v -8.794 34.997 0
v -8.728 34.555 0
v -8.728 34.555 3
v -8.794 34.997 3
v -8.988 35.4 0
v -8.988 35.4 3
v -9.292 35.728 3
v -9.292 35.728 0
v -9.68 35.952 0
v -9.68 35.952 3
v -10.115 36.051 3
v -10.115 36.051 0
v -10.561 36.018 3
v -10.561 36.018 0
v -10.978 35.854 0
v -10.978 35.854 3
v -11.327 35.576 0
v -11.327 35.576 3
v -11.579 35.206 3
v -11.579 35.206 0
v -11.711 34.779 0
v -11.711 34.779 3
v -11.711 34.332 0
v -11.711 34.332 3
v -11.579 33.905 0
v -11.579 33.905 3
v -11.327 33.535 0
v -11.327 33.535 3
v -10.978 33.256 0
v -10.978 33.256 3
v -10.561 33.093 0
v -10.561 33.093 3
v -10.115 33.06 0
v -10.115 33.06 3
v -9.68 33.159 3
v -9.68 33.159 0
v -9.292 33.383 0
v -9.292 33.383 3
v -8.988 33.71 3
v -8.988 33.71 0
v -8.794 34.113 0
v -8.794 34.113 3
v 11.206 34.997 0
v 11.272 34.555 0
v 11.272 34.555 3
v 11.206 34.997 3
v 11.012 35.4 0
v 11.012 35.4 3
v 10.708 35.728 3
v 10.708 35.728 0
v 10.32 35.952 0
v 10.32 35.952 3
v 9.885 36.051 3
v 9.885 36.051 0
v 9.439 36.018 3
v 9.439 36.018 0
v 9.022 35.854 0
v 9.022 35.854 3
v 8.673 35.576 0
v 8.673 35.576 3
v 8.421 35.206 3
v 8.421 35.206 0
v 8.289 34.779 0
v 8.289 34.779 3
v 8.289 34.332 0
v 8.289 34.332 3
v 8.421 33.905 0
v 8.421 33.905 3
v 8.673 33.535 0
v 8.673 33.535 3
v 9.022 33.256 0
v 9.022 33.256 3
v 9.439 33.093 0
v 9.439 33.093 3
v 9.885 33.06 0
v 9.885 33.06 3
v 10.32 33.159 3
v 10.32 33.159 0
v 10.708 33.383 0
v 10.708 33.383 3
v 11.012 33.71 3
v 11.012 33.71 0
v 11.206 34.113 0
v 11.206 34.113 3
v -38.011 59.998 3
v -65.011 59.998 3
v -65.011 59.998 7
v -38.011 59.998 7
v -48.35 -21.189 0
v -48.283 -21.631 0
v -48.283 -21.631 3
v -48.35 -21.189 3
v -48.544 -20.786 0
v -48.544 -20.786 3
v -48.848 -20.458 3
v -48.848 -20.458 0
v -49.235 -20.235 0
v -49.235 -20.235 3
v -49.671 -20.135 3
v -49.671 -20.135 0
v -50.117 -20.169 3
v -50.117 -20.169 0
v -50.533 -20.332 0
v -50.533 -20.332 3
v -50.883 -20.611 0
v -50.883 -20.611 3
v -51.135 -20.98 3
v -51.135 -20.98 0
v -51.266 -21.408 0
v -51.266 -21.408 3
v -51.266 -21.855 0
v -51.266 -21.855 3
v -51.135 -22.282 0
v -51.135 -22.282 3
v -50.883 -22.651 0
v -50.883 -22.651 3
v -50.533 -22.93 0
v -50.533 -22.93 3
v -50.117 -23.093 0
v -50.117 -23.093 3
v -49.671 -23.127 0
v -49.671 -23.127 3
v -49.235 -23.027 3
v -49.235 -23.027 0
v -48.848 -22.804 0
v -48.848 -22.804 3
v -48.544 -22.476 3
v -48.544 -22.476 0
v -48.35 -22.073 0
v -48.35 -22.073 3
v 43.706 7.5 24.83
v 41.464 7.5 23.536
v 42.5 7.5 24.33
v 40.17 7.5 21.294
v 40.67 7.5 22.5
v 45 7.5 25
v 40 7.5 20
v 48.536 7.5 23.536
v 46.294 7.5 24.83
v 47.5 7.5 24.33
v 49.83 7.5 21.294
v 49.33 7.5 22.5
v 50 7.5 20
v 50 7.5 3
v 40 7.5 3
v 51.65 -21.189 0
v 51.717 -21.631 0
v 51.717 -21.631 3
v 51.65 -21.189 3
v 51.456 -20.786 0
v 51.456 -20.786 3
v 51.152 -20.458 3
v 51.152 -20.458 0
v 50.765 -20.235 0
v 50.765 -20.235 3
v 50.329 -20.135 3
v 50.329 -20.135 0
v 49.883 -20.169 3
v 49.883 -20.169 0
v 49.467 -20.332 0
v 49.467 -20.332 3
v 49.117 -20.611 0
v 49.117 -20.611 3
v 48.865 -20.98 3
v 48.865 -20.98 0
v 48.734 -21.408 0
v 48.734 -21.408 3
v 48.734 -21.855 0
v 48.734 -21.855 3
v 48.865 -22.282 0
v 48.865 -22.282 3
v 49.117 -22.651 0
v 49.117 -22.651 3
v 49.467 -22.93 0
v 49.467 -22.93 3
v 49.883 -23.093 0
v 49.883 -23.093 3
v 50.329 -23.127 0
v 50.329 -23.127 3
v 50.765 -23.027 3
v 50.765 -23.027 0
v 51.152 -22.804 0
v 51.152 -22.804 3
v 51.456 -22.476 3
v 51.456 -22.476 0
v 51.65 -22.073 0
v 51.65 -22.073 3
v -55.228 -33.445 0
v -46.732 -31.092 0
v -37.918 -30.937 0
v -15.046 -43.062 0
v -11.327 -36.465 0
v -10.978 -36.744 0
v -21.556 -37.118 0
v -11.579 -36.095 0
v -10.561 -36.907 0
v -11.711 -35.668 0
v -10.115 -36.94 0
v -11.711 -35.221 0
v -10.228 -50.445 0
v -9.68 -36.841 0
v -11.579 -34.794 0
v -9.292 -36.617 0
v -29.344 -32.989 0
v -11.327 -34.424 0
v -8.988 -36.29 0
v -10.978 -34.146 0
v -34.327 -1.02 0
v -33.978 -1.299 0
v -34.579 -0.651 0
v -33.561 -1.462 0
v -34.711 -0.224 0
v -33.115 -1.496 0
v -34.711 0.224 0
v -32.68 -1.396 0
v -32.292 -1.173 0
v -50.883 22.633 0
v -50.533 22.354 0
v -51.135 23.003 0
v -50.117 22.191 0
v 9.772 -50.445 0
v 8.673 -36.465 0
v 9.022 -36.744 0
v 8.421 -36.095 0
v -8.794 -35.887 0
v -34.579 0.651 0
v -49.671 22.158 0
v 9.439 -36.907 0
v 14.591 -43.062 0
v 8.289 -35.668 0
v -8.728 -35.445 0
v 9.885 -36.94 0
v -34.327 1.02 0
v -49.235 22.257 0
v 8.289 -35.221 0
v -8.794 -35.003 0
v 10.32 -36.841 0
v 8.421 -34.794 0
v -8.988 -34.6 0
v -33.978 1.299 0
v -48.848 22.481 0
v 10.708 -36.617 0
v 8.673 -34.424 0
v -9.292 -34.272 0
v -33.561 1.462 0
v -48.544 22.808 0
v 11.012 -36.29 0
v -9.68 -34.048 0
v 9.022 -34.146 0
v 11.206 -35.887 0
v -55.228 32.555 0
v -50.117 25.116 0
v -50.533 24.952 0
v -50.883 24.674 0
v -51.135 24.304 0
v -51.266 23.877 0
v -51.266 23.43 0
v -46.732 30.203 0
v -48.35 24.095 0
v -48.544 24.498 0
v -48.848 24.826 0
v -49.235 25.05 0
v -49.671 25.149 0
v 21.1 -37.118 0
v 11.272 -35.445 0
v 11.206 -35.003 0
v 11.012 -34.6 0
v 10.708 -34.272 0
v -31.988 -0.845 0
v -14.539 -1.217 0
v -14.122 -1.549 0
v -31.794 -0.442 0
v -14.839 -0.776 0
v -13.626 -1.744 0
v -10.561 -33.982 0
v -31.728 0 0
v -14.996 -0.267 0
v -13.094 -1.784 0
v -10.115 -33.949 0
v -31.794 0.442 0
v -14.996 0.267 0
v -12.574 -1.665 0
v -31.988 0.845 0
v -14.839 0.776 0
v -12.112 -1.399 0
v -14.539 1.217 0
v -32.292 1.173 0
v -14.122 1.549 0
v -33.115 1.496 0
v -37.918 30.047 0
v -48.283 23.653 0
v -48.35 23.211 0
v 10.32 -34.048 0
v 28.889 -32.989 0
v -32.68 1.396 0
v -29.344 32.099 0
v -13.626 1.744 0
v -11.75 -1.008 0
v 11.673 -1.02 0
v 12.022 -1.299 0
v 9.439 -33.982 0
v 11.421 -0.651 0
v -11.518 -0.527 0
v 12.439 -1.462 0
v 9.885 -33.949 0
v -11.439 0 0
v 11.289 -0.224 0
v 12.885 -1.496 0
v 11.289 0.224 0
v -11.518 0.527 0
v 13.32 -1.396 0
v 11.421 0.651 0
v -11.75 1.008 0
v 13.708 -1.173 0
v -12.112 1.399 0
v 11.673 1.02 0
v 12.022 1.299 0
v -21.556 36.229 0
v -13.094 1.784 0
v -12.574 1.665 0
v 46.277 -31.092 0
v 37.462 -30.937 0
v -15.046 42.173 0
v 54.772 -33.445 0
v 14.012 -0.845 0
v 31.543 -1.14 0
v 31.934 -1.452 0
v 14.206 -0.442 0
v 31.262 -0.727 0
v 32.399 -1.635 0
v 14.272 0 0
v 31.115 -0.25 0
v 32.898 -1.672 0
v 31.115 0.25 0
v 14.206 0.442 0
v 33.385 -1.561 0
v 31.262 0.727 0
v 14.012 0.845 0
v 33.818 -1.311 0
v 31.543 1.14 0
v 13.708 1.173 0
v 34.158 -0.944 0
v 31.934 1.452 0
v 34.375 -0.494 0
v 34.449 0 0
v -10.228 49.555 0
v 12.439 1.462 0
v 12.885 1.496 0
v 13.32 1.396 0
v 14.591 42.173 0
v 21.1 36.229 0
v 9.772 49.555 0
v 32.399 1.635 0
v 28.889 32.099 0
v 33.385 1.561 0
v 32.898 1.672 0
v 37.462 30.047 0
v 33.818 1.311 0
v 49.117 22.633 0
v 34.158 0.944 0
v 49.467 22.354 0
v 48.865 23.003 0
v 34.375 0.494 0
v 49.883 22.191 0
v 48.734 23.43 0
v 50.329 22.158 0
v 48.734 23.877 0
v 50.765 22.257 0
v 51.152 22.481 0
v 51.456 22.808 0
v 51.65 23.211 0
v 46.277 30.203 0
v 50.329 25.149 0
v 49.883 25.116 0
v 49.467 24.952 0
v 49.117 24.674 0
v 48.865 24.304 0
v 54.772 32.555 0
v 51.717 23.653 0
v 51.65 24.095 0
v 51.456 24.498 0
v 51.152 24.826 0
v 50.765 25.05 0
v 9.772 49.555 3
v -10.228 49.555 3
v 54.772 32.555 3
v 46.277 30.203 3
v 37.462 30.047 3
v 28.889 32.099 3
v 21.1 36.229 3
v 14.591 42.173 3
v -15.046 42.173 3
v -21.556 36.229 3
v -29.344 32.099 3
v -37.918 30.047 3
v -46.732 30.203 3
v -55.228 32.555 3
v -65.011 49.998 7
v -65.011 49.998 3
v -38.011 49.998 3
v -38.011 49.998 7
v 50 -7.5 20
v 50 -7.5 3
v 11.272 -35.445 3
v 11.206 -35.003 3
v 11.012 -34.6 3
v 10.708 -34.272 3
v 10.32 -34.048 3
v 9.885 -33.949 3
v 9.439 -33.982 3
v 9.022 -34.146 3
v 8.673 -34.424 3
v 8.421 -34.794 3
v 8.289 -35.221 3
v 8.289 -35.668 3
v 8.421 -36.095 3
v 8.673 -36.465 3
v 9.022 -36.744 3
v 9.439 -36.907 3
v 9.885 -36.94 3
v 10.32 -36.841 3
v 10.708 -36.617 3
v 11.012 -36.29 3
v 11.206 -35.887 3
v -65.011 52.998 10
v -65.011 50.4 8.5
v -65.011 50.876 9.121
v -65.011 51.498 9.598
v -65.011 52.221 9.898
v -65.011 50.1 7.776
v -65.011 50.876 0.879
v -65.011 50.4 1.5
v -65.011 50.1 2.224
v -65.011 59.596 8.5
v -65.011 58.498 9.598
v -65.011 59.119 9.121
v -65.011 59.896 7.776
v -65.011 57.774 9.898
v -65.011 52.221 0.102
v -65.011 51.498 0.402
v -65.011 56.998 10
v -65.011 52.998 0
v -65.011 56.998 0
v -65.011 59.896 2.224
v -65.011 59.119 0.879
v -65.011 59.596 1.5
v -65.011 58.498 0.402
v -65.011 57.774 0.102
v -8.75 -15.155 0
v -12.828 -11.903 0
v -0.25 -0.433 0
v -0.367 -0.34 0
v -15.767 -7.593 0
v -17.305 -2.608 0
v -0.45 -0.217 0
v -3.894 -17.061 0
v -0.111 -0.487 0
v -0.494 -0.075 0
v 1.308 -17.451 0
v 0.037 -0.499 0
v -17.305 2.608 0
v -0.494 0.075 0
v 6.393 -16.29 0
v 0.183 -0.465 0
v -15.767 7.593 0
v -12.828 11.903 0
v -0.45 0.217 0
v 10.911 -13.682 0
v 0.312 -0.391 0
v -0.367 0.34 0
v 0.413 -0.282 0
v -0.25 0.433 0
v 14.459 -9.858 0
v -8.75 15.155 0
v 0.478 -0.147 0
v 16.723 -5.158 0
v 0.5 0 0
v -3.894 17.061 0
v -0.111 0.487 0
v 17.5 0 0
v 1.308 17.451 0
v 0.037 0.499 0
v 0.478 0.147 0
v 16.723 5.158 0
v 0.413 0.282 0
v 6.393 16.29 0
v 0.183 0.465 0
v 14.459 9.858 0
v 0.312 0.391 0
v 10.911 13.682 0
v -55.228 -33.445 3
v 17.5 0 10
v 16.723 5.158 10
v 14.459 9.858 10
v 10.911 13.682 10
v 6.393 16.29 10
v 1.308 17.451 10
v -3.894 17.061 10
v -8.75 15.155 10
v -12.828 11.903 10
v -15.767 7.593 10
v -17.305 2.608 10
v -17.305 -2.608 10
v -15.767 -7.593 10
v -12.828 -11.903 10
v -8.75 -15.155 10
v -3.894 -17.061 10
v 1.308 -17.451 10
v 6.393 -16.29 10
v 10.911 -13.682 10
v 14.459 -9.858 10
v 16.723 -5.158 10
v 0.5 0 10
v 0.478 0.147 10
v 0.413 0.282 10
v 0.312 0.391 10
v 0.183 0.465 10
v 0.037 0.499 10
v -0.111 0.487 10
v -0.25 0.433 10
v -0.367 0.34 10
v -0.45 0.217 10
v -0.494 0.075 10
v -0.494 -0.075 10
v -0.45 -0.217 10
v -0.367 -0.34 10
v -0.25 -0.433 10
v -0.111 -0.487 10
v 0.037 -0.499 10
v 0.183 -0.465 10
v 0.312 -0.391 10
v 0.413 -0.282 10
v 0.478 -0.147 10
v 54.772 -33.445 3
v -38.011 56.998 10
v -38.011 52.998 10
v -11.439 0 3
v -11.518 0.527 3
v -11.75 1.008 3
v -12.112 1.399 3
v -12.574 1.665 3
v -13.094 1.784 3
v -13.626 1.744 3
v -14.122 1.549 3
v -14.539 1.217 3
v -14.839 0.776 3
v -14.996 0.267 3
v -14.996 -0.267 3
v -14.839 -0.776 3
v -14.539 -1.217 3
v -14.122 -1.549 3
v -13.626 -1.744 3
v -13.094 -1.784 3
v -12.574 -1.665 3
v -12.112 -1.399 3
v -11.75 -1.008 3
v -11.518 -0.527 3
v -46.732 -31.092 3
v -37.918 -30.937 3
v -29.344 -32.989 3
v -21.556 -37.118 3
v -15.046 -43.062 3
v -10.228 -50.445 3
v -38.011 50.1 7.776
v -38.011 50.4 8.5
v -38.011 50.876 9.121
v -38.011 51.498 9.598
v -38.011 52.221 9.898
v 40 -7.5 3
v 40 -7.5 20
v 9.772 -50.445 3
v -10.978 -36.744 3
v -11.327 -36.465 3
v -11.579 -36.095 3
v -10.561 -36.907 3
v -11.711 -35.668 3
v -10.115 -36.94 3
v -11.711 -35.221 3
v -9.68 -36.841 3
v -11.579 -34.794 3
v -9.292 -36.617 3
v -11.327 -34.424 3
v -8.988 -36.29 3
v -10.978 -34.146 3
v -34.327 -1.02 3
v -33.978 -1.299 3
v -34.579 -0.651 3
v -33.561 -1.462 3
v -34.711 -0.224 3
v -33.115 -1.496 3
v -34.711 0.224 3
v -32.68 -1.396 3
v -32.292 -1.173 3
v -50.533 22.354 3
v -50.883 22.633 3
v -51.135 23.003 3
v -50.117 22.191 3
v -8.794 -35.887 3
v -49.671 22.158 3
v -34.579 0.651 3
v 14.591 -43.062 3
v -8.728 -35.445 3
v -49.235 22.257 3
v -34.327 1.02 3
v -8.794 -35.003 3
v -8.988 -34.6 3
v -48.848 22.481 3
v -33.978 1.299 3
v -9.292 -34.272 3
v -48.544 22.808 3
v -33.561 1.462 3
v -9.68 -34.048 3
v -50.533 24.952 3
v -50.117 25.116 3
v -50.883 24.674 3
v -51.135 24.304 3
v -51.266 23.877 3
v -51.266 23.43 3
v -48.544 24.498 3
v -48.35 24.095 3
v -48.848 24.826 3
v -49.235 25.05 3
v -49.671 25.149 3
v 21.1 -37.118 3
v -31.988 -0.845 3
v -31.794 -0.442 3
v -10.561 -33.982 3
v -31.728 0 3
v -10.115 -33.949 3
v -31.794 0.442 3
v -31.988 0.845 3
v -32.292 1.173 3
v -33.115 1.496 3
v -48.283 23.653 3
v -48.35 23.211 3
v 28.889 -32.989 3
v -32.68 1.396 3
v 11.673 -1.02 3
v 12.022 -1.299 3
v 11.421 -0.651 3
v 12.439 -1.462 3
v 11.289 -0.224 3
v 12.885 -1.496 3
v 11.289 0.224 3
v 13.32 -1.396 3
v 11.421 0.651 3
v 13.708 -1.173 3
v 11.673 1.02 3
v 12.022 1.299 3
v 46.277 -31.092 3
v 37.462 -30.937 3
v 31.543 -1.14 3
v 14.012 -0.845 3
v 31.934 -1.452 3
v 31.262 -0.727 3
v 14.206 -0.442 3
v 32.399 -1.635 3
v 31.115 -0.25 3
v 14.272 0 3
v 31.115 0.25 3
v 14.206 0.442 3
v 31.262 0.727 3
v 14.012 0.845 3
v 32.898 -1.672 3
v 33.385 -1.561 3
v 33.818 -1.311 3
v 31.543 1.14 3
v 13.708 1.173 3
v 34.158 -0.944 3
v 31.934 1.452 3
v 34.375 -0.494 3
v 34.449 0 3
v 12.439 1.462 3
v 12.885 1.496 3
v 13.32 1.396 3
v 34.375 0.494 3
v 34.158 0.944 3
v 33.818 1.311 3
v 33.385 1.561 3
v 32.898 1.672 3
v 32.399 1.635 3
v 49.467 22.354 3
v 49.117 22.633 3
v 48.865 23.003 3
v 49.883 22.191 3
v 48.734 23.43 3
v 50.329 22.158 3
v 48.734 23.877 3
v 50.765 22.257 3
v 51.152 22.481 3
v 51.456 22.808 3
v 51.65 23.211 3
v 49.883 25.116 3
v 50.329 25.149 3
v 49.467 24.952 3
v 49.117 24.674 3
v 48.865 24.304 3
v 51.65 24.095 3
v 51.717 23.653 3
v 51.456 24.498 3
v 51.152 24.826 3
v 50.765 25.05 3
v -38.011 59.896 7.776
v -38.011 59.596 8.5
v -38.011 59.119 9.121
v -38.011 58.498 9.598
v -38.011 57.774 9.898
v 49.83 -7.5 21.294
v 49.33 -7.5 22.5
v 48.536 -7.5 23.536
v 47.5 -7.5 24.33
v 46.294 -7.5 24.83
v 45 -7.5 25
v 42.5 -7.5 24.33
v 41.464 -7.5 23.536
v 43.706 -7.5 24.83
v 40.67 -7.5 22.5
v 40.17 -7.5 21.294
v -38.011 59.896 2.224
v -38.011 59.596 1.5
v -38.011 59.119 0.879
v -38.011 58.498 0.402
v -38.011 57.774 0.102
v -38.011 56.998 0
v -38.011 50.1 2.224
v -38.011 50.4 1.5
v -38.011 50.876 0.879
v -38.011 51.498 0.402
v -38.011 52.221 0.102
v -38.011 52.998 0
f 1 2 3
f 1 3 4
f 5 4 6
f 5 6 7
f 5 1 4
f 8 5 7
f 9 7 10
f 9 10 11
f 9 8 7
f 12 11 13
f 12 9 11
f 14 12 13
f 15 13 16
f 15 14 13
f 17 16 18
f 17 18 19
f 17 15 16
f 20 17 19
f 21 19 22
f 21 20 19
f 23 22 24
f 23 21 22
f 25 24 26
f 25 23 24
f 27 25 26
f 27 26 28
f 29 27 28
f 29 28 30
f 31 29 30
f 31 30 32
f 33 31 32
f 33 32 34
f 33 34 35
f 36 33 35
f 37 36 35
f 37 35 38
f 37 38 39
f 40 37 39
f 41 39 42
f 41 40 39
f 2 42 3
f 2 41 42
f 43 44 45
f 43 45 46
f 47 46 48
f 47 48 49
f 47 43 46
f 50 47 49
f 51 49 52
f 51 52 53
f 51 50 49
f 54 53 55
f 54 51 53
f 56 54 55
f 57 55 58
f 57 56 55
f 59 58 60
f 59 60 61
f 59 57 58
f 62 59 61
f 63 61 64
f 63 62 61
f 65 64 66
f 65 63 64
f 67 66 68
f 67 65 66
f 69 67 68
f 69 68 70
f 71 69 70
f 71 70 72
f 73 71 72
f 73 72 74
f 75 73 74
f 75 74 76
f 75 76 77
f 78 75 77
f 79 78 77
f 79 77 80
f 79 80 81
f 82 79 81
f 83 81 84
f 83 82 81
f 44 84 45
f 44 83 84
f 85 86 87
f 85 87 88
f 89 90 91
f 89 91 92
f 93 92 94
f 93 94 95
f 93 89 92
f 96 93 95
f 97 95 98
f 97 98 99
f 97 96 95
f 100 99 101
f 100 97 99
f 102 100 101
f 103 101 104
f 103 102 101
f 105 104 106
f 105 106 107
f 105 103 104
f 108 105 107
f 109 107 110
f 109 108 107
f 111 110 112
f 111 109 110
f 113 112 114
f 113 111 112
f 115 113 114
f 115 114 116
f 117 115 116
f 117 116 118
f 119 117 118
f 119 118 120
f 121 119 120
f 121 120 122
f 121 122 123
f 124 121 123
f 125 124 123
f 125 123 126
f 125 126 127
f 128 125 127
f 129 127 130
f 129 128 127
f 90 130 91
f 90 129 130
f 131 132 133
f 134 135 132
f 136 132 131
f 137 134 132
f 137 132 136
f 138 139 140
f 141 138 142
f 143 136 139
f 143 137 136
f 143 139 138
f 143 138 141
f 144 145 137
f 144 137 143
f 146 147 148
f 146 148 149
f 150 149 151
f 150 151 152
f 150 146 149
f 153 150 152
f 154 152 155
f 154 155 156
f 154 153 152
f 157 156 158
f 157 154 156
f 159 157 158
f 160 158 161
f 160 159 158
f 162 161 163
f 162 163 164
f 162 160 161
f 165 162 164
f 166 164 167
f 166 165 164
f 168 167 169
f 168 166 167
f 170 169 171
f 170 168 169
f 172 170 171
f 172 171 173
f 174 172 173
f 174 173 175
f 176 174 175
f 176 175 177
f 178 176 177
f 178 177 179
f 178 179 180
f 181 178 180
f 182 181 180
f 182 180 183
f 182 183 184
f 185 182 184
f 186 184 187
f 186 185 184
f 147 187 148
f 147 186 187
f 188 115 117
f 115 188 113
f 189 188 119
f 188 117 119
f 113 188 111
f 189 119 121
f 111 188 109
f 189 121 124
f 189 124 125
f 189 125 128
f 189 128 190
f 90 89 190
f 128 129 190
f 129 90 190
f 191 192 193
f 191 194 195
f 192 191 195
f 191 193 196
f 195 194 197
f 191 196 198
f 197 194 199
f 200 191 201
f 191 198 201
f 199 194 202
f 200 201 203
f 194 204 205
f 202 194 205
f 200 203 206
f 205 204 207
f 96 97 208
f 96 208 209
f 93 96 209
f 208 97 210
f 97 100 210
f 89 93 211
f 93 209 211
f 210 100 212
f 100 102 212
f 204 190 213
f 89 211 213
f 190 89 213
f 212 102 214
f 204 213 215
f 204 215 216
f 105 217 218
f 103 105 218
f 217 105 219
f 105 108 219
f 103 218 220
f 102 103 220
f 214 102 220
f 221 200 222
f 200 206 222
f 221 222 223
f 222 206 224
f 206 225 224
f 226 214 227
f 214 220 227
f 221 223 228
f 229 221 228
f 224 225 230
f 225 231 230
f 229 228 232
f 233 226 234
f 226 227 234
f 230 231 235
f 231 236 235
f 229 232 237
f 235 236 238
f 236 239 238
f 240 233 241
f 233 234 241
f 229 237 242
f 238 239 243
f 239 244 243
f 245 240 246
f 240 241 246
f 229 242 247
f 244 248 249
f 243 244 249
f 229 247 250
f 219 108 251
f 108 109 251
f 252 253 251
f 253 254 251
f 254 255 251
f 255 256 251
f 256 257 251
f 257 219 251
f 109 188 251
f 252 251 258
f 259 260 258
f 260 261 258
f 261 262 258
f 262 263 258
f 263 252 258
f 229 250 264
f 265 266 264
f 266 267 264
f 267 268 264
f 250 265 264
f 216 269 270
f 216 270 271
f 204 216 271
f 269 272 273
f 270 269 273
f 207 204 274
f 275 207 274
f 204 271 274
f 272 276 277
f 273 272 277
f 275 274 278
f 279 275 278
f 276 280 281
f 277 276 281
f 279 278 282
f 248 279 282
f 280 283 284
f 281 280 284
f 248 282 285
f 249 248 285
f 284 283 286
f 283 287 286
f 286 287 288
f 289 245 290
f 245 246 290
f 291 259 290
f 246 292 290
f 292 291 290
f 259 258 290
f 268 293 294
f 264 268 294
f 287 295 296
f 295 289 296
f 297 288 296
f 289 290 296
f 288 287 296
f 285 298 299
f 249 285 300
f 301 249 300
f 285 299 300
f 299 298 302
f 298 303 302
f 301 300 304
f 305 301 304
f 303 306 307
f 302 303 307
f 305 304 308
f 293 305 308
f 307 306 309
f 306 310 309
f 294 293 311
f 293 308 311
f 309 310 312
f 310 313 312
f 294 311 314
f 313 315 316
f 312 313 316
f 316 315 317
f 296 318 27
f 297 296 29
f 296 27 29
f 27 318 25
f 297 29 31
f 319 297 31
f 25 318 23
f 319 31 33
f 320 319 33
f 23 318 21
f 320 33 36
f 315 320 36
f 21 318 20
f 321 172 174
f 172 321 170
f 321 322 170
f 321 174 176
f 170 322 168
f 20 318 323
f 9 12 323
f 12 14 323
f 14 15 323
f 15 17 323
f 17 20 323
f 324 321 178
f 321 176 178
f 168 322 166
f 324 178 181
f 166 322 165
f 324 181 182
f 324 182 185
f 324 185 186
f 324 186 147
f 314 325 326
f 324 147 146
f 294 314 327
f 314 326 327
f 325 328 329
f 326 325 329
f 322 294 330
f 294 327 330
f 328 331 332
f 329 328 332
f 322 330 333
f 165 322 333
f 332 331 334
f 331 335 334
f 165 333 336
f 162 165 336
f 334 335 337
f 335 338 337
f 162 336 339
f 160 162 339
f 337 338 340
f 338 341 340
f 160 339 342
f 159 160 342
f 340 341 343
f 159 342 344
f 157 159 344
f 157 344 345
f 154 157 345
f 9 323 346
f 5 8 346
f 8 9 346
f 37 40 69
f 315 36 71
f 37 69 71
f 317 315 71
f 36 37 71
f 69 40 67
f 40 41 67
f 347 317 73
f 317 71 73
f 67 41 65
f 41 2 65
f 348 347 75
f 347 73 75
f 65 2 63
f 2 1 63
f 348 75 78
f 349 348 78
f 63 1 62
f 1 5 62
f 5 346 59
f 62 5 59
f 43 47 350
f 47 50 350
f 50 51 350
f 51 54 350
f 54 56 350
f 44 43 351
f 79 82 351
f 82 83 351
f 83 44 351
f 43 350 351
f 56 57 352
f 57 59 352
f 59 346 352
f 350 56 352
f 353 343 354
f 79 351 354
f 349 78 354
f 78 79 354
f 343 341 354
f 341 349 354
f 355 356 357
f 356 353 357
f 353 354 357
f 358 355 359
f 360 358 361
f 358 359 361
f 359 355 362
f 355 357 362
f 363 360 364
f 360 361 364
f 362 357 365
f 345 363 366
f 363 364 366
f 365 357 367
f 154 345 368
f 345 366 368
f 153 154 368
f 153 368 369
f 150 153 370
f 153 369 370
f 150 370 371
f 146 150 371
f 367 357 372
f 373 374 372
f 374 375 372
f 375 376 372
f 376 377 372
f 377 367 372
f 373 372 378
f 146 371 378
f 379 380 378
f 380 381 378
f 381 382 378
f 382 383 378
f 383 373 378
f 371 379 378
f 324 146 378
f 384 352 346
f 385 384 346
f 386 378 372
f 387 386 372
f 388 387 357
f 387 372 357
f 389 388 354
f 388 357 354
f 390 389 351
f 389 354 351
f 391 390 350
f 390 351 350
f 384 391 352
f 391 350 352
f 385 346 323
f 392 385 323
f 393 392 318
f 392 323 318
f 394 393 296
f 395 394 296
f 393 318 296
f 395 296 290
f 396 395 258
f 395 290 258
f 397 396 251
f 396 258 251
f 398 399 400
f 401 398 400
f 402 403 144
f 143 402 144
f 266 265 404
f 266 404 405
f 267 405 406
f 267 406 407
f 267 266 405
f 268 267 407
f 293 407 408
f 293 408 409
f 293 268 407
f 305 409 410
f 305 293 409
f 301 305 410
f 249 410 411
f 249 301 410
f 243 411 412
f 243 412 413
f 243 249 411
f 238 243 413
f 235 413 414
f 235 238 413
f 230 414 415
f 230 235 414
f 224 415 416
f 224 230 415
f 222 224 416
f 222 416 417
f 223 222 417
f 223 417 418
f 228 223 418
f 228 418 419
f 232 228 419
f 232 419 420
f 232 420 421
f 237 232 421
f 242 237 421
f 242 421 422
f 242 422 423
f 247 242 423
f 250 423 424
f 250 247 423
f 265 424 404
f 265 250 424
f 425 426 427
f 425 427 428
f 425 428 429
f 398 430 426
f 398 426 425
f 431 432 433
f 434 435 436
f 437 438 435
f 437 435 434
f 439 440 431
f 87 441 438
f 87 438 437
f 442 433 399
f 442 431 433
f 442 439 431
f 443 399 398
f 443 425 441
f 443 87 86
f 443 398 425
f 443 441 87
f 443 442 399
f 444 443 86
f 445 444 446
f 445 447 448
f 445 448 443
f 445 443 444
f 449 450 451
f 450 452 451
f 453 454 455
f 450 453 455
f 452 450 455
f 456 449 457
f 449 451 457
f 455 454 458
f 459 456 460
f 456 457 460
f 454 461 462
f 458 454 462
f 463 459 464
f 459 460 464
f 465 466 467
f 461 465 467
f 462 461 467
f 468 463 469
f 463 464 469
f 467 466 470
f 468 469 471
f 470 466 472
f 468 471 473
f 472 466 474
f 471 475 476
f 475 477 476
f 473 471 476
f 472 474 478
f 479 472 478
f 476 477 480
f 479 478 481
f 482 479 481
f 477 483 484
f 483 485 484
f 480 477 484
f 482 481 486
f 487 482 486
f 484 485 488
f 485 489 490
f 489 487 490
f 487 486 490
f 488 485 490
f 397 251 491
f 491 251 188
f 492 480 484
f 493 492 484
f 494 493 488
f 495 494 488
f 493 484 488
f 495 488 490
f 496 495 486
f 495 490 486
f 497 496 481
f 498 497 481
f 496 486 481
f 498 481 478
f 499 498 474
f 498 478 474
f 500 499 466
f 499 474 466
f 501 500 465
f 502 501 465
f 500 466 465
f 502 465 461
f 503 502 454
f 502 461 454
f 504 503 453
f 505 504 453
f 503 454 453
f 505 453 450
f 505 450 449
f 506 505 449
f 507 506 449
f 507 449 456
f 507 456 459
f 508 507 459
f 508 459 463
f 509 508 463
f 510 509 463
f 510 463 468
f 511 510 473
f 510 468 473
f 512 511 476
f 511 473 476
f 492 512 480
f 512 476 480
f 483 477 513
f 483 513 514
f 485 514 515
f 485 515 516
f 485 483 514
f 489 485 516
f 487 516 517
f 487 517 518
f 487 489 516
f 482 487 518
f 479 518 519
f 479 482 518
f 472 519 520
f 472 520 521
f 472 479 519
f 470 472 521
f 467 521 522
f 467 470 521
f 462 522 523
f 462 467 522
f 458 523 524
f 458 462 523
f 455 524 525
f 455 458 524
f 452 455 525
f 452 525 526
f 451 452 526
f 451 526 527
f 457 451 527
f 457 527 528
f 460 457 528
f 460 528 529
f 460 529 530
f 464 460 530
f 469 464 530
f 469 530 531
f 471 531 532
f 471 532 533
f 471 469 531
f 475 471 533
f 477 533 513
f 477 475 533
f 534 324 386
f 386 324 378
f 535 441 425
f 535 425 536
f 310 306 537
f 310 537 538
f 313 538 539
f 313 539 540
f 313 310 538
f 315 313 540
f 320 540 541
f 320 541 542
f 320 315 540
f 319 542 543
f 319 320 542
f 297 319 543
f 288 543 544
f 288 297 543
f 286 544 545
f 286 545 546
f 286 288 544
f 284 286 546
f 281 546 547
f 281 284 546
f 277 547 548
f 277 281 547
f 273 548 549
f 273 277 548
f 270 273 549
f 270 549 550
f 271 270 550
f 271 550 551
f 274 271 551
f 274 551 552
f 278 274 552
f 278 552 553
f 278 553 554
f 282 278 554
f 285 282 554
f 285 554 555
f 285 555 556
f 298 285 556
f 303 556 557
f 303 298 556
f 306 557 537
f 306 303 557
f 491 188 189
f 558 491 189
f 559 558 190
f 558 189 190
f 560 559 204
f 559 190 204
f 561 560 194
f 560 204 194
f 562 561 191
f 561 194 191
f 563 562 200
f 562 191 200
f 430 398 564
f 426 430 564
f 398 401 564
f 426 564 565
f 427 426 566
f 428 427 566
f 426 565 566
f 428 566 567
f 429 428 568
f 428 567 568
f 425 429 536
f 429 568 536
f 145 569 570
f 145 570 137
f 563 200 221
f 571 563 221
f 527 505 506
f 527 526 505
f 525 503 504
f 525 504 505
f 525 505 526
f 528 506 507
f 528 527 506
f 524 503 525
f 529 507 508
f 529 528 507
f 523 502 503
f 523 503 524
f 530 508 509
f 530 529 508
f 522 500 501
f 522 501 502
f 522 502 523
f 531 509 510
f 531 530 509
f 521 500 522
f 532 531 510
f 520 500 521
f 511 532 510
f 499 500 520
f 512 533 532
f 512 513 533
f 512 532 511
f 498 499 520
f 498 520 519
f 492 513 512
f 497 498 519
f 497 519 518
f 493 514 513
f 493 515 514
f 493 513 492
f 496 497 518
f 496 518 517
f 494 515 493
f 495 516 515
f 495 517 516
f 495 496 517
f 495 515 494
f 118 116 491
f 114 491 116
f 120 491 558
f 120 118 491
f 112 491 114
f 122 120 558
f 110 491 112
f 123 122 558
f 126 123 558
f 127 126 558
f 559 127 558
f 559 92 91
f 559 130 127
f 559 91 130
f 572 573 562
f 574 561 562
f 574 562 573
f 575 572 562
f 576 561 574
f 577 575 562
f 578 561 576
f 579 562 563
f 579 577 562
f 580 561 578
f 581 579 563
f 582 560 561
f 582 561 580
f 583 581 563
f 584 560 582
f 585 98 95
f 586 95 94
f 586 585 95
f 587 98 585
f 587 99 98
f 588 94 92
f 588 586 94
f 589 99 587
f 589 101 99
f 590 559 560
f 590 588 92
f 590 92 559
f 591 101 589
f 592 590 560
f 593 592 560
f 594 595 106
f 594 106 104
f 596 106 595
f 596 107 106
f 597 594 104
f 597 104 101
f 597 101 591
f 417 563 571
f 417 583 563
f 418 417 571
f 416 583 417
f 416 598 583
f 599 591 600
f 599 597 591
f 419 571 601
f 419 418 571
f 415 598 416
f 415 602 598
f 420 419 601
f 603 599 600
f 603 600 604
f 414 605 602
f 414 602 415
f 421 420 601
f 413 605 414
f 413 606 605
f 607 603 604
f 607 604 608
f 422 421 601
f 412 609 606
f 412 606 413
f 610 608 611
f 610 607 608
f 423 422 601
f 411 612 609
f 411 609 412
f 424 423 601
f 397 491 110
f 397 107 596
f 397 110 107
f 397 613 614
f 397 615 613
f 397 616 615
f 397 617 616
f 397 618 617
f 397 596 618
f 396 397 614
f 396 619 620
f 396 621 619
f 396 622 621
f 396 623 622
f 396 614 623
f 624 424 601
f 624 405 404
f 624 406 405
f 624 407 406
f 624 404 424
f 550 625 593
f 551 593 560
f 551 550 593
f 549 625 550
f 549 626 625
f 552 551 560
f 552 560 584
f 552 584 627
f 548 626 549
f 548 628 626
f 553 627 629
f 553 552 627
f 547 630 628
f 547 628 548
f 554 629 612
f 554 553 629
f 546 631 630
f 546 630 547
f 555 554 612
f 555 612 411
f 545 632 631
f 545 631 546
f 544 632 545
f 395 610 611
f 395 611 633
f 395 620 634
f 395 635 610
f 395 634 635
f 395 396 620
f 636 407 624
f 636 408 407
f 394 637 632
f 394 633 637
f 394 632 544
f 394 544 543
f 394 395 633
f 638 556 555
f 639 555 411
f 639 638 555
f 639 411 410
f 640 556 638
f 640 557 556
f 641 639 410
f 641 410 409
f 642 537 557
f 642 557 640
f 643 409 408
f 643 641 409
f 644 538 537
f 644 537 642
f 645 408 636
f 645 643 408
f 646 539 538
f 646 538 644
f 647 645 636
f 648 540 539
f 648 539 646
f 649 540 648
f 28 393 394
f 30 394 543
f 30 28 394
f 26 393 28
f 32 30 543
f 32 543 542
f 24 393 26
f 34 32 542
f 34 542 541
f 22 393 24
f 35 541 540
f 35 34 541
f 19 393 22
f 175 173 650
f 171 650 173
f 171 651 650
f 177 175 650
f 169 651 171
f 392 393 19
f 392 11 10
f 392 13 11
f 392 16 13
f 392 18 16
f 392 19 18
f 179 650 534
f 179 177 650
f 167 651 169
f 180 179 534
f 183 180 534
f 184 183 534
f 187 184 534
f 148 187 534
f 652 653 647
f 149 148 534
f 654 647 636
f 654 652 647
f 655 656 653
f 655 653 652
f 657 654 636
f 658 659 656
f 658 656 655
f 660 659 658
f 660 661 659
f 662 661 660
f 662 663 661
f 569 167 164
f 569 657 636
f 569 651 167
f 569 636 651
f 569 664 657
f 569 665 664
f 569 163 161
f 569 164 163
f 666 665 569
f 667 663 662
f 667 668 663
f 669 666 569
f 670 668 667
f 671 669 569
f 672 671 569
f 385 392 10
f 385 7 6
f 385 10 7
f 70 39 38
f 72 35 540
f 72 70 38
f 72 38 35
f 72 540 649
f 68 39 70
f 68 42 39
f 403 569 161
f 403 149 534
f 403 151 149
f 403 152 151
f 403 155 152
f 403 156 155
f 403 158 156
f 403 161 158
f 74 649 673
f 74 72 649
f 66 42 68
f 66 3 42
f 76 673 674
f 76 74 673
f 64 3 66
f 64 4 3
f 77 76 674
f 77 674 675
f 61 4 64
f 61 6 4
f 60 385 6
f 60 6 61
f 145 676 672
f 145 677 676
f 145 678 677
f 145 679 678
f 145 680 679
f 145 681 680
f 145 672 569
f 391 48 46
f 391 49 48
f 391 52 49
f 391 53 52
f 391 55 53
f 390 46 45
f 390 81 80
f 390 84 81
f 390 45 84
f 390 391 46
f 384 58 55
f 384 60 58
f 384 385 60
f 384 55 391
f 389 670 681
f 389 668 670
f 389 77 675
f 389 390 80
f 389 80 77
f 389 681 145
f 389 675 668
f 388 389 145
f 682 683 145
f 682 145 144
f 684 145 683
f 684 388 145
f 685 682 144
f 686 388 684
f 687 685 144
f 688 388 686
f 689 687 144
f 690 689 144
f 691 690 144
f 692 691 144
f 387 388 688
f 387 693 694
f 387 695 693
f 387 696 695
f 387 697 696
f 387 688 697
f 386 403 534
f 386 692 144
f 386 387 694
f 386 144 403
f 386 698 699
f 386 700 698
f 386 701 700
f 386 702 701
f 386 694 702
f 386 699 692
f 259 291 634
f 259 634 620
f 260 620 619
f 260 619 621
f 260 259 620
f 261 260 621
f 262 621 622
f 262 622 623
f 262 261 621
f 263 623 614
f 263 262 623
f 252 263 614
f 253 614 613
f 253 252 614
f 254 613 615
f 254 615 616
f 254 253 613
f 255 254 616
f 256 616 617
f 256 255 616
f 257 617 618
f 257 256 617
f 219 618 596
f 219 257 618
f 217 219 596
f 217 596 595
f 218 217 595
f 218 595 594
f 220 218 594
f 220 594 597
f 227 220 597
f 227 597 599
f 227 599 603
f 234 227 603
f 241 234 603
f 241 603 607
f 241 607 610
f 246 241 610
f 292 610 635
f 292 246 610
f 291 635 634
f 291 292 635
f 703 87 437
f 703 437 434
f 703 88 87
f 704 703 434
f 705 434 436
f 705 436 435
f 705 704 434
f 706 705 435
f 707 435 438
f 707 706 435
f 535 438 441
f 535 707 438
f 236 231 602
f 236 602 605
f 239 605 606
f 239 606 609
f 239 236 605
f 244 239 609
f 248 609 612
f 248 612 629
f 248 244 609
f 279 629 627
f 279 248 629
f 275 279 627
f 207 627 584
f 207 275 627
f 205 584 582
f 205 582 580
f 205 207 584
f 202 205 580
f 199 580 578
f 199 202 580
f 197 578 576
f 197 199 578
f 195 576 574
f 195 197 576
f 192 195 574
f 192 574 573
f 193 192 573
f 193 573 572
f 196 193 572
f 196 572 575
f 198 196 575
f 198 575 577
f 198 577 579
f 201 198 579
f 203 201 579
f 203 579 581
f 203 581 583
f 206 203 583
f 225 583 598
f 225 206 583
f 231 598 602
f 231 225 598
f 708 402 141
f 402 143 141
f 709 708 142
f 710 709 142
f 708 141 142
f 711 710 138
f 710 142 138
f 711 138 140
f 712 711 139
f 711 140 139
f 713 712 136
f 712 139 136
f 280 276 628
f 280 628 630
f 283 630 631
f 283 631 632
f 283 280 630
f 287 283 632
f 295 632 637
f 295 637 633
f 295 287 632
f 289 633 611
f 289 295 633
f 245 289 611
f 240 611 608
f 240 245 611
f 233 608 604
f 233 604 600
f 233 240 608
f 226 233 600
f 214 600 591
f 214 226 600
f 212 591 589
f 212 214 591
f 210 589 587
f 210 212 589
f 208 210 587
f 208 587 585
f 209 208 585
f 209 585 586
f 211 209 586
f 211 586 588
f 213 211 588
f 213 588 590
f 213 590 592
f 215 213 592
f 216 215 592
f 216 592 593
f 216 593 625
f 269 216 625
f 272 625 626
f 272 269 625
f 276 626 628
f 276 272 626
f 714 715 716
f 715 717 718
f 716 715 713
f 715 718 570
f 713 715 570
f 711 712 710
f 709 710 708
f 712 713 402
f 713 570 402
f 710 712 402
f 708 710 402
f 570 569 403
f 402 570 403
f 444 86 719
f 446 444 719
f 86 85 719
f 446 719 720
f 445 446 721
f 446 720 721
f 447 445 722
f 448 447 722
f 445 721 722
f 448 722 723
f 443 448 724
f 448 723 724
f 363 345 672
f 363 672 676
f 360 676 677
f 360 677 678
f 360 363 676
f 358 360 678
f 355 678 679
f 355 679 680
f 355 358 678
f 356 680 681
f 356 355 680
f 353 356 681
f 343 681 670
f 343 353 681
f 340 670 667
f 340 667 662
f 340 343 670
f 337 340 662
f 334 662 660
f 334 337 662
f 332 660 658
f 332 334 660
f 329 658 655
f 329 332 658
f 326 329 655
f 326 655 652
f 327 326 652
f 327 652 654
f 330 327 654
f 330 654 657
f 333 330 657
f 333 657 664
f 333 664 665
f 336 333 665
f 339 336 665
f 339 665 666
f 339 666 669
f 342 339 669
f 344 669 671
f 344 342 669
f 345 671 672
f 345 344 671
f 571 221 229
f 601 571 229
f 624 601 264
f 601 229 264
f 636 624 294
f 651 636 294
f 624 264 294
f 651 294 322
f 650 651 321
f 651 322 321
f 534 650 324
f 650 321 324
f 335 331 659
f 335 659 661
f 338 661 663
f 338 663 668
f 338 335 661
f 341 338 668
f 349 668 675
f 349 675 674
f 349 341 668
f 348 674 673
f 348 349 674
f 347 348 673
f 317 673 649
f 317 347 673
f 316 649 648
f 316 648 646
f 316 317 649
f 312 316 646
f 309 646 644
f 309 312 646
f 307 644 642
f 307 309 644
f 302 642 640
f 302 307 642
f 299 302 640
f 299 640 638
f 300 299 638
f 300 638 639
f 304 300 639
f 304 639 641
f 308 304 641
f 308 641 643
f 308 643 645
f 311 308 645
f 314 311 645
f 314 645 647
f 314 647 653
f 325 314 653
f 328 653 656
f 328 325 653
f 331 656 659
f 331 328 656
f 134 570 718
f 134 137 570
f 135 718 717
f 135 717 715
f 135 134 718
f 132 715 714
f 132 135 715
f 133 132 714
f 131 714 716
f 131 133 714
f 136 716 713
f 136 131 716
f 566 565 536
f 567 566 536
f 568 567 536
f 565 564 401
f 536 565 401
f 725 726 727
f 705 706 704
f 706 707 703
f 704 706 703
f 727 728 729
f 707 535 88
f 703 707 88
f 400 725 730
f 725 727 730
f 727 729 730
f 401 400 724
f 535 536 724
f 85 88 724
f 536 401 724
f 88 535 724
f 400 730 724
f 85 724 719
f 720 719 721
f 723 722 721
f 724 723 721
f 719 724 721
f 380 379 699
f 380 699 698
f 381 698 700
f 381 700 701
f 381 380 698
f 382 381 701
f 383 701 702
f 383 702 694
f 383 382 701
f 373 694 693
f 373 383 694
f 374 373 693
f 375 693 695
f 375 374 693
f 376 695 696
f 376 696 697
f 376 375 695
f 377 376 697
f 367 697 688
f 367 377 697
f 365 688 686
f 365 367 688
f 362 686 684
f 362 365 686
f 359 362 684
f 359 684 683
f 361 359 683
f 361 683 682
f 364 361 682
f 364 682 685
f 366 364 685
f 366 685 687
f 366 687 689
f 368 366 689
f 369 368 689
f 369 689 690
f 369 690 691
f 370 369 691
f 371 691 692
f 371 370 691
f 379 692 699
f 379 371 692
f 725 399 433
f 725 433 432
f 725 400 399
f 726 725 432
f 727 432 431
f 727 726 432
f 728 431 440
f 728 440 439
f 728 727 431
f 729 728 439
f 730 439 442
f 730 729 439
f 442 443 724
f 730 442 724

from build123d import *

# Parameters (mm, degrees)
F0_R     = 17.5
F0_R_2   = 0.5
F1_DEPTH = 10
F2_W     = 27
F2_H     = 10
F3_DEPTH = 10
F4_R     = 3
F5_R     = 1.5
F5_R_2   = 1.7887858733
F5_R_3   = 1.6766314054
F6_DEPTH = 3
F7_W     = 10
F7_H     = 15
F8_DEPTH = 25
F9_R     = 4.99999


# Not quite as in the source:
# - a fillet or chamfer is up to 0.001 mm smaller than in the source, because OpenCascade refuses the exact size


with BuildPart() as f1:
    # F0 (on Top) → F1 (new body)
    with BuildSketch(Plane.XY):
        Circle(F0_R)
        Circle(F0_R_2, mode=Mode.SUBTRACT)
    extrude(amount=F1_DEPTH)


with BuildPart() as f3:
    # F2 (on Top) → F3 (new body)
    with BuildSketch(Plane.XY):
        with Locations((-51.5112442672, 54.997754395)):
            Rectangle(F2_W, F2_H)
    extrude(amount=F3_DEPTH)

    # F4
    f4_edges = [f3.edges().sort_by_distance(p)[0] for p in [
        (-51.511244, 59.997754, 10),
        (-51.511244, 49.997754, 10),
        (-51.511244, 49.997754, 0),
        (-51.511244, 59.997754, 0),
    ]]
    fillet(f4_edges, radius=F4_R)


with BuildPart() as f6:
    # F5 (on Top) → F6 (new body)
    with BuildSketch(Plane.XY):
        with BuildLine():
            ThreePointArc((54.7724512979, 32.5553555772), (28.8891229863, 32.099486517), (9.7724512979, 49.5553555772))
            Line((9.7724512979, 49.5553555772), (-10.2275487021, 49.5553555772))
            ThreePointArc((-10.2275487021, 49.5553555772), (-29.3442203904, 32.099486517), (-55.2275487021, 32.5553555772))
            Line((-55.2275487021, 32.5553555772), (-55.2275487021, -33.4446444228))
            ThreePointArc((-55.2275487021, -33.4446444228), (-29.3442203904, -32.9887753626), (-10.2275487021, -50.4446444228))
            Line((-10.2275487021, -50.4446444228), (9.7724512979, -50.4446444228))
            ThreePointArc((9.7724512979, -50.4446444228), (28.8891229863, -32.9887753626), (54.7724512979, -33.4446444228))
            Line((54.7724512979, -33.4446444228), (54.7724512979, 32.5553555772))
        make_face()
        with Locations((-10.2275487021, -35.4446444228)):
            Circle(F5_R, mode=Mode.SUBTRACT)
        with Locations((-49.7831985605, -21.6310646678)):
            Circle(F5_R, mode=Mode.SUBTRACT)
        with Locations((9.7724512979, -35.4446444228)):
            Circle(F5_R, mode=Mode.SUBTRACT)
        with Locations((50.2168014395, -21.6310646678)):
            Circle(F5_R, mode=Mode.SUBTRACT)
        with Locations((-33.2275487021, 0)):
            Circle(F5_R, mode=Mode.SUBTRACT)
        with Locations((-49.7831985605, 23.6533302814)):
            Circle(F5_R, mode=Mode.SUBTRACT)
        with Locations((-13.2275487021, 0)):
            Circle(F5_R_2, mode=Mode.SUBTRACT)
        with Locations((-10.2275487021, 34.5553555772)):
            Circle(F5_R, mode=Mode.SUBTRACT)
        with Locations((12.7724512979, 0)):
            Circle(F5_R, mode=Mode.SUBTRACT)
        with Locations((32.7724512979, 0)):
            Circle(F5_R_3, mode=Mode.SUBTRACT)
        with Locations((50.2168014395, 23.6533302814)):
            Circle(F5_R, mode=Mode.SUBTRACT)
        with Locations((9.7724512979, 34.5553555772)):
            Circle(F5_R, mode=Mode.SUBTRACT)
    extrude(amount=F6_DEPTH)

    # F7 (on Top) → F8 (join)
    with BuildSketch(Plane.XY):
        with Locations((45, 0)):
            Rectangle(F7_W, F7_H)
    extrude(amount=F8_DEPTH)

    # F9 (radius 5 in the source; OpenCascade refuses exactly that, so slightly less here)
    f9_edges = [f6.edges().sort_by_distance(p)[0] for p in [
        (50, 0, 25),
        (40, 0, 25),
    ]]
    fillet(f9_edges, radius=F9_R)


solid = Compound([f1.part, f3.part, f6.part])
